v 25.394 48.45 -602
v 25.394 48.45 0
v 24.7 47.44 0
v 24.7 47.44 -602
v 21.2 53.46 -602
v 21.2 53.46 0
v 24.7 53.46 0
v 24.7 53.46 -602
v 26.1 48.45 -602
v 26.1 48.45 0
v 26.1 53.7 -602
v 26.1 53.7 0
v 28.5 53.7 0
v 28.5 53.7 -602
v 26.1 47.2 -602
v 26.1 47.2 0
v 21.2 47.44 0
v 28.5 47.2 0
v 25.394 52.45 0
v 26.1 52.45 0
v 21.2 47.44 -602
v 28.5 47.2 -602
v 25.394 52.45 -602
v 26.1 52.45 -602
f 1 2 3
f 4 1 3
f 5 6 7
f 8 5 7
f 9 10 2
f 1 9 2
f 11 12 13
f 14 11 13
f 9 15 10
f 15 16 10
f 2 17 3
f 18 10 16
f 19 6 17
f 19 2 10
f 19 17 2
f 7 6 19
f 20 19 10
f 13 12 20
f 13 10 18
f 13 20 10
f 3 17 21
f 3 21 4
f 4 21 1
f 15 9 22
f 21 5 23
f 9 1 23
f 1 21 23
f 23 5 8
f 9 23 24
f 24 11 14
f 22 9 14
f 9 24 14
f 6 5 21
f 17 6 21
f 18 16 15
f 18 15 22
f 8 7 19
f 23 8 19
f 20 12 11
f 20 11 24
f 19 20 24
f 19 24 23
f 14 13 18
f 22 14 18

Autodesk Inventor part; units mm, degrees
ref_plane "YZ Plane" through (0, 0, 0) normal (1, 0, 0) x (0, 1, 0)
ref_plane "XZ Plane" through (0, 0, 0) normal (0, 1, 0) x (-1, 0, 0)
ref_plane "XY Plane" through (0, 0, 0) normal (0, 0, 1) x (1, 0, 0)
sketch "Boceto1" plane through (0, 0, 0) normal (0, 0, 1) x (1, 0, 0)
  line L0 (28.5, 53.7) -> (28.5, 47.2)
  line L1 (26.1, 47.2) -> (28.5, 47.2)
  line L2 (26.1, 48.45) -> (25.3942, 48.45)
  line L3 (25.3942, 48.45) -> (24.7, 47.44)
  line L4 (26.1, 52.45) -> (25.3942, 52.45)
  line L5 (26.1, 53.7) -> (28.5, 53.7)
  line L6 (24.7, 53.46) -> (25.3942, 52.45)
  line L7 (26.1, 53.7) -> (26.1, 52.45)
  line L8 (26.1, 47.2) -> (26.1, 48.45)
  line L9 (21.2, 53.46) -> (24.7, 53.46)
  line L10 (21.2, 47.44) -> (24.7, 47.44)
  line L11 (21.2, 53.46) -> (21.2, 47.44)
  point P0 (28.5, 50.45)
  dimension "d78" = 6.5
  dimension "d88" = 2.4
  dimension "d95" = 6.02
  dimension "d100" = 2.4
  dimension "d108" = 4
  dimension "d109" = 0.7058
  dimension "d110" = 0.7058
  dimension "d145" = 2
  dimension "d146" = 2
  dimension "d150" = 3.5
extrude "Extrusión1" add sketch "Boceto1" against normal blind 602
properties part number "SP40-02 JUNTA INT 207" material "Caucho, negro"
